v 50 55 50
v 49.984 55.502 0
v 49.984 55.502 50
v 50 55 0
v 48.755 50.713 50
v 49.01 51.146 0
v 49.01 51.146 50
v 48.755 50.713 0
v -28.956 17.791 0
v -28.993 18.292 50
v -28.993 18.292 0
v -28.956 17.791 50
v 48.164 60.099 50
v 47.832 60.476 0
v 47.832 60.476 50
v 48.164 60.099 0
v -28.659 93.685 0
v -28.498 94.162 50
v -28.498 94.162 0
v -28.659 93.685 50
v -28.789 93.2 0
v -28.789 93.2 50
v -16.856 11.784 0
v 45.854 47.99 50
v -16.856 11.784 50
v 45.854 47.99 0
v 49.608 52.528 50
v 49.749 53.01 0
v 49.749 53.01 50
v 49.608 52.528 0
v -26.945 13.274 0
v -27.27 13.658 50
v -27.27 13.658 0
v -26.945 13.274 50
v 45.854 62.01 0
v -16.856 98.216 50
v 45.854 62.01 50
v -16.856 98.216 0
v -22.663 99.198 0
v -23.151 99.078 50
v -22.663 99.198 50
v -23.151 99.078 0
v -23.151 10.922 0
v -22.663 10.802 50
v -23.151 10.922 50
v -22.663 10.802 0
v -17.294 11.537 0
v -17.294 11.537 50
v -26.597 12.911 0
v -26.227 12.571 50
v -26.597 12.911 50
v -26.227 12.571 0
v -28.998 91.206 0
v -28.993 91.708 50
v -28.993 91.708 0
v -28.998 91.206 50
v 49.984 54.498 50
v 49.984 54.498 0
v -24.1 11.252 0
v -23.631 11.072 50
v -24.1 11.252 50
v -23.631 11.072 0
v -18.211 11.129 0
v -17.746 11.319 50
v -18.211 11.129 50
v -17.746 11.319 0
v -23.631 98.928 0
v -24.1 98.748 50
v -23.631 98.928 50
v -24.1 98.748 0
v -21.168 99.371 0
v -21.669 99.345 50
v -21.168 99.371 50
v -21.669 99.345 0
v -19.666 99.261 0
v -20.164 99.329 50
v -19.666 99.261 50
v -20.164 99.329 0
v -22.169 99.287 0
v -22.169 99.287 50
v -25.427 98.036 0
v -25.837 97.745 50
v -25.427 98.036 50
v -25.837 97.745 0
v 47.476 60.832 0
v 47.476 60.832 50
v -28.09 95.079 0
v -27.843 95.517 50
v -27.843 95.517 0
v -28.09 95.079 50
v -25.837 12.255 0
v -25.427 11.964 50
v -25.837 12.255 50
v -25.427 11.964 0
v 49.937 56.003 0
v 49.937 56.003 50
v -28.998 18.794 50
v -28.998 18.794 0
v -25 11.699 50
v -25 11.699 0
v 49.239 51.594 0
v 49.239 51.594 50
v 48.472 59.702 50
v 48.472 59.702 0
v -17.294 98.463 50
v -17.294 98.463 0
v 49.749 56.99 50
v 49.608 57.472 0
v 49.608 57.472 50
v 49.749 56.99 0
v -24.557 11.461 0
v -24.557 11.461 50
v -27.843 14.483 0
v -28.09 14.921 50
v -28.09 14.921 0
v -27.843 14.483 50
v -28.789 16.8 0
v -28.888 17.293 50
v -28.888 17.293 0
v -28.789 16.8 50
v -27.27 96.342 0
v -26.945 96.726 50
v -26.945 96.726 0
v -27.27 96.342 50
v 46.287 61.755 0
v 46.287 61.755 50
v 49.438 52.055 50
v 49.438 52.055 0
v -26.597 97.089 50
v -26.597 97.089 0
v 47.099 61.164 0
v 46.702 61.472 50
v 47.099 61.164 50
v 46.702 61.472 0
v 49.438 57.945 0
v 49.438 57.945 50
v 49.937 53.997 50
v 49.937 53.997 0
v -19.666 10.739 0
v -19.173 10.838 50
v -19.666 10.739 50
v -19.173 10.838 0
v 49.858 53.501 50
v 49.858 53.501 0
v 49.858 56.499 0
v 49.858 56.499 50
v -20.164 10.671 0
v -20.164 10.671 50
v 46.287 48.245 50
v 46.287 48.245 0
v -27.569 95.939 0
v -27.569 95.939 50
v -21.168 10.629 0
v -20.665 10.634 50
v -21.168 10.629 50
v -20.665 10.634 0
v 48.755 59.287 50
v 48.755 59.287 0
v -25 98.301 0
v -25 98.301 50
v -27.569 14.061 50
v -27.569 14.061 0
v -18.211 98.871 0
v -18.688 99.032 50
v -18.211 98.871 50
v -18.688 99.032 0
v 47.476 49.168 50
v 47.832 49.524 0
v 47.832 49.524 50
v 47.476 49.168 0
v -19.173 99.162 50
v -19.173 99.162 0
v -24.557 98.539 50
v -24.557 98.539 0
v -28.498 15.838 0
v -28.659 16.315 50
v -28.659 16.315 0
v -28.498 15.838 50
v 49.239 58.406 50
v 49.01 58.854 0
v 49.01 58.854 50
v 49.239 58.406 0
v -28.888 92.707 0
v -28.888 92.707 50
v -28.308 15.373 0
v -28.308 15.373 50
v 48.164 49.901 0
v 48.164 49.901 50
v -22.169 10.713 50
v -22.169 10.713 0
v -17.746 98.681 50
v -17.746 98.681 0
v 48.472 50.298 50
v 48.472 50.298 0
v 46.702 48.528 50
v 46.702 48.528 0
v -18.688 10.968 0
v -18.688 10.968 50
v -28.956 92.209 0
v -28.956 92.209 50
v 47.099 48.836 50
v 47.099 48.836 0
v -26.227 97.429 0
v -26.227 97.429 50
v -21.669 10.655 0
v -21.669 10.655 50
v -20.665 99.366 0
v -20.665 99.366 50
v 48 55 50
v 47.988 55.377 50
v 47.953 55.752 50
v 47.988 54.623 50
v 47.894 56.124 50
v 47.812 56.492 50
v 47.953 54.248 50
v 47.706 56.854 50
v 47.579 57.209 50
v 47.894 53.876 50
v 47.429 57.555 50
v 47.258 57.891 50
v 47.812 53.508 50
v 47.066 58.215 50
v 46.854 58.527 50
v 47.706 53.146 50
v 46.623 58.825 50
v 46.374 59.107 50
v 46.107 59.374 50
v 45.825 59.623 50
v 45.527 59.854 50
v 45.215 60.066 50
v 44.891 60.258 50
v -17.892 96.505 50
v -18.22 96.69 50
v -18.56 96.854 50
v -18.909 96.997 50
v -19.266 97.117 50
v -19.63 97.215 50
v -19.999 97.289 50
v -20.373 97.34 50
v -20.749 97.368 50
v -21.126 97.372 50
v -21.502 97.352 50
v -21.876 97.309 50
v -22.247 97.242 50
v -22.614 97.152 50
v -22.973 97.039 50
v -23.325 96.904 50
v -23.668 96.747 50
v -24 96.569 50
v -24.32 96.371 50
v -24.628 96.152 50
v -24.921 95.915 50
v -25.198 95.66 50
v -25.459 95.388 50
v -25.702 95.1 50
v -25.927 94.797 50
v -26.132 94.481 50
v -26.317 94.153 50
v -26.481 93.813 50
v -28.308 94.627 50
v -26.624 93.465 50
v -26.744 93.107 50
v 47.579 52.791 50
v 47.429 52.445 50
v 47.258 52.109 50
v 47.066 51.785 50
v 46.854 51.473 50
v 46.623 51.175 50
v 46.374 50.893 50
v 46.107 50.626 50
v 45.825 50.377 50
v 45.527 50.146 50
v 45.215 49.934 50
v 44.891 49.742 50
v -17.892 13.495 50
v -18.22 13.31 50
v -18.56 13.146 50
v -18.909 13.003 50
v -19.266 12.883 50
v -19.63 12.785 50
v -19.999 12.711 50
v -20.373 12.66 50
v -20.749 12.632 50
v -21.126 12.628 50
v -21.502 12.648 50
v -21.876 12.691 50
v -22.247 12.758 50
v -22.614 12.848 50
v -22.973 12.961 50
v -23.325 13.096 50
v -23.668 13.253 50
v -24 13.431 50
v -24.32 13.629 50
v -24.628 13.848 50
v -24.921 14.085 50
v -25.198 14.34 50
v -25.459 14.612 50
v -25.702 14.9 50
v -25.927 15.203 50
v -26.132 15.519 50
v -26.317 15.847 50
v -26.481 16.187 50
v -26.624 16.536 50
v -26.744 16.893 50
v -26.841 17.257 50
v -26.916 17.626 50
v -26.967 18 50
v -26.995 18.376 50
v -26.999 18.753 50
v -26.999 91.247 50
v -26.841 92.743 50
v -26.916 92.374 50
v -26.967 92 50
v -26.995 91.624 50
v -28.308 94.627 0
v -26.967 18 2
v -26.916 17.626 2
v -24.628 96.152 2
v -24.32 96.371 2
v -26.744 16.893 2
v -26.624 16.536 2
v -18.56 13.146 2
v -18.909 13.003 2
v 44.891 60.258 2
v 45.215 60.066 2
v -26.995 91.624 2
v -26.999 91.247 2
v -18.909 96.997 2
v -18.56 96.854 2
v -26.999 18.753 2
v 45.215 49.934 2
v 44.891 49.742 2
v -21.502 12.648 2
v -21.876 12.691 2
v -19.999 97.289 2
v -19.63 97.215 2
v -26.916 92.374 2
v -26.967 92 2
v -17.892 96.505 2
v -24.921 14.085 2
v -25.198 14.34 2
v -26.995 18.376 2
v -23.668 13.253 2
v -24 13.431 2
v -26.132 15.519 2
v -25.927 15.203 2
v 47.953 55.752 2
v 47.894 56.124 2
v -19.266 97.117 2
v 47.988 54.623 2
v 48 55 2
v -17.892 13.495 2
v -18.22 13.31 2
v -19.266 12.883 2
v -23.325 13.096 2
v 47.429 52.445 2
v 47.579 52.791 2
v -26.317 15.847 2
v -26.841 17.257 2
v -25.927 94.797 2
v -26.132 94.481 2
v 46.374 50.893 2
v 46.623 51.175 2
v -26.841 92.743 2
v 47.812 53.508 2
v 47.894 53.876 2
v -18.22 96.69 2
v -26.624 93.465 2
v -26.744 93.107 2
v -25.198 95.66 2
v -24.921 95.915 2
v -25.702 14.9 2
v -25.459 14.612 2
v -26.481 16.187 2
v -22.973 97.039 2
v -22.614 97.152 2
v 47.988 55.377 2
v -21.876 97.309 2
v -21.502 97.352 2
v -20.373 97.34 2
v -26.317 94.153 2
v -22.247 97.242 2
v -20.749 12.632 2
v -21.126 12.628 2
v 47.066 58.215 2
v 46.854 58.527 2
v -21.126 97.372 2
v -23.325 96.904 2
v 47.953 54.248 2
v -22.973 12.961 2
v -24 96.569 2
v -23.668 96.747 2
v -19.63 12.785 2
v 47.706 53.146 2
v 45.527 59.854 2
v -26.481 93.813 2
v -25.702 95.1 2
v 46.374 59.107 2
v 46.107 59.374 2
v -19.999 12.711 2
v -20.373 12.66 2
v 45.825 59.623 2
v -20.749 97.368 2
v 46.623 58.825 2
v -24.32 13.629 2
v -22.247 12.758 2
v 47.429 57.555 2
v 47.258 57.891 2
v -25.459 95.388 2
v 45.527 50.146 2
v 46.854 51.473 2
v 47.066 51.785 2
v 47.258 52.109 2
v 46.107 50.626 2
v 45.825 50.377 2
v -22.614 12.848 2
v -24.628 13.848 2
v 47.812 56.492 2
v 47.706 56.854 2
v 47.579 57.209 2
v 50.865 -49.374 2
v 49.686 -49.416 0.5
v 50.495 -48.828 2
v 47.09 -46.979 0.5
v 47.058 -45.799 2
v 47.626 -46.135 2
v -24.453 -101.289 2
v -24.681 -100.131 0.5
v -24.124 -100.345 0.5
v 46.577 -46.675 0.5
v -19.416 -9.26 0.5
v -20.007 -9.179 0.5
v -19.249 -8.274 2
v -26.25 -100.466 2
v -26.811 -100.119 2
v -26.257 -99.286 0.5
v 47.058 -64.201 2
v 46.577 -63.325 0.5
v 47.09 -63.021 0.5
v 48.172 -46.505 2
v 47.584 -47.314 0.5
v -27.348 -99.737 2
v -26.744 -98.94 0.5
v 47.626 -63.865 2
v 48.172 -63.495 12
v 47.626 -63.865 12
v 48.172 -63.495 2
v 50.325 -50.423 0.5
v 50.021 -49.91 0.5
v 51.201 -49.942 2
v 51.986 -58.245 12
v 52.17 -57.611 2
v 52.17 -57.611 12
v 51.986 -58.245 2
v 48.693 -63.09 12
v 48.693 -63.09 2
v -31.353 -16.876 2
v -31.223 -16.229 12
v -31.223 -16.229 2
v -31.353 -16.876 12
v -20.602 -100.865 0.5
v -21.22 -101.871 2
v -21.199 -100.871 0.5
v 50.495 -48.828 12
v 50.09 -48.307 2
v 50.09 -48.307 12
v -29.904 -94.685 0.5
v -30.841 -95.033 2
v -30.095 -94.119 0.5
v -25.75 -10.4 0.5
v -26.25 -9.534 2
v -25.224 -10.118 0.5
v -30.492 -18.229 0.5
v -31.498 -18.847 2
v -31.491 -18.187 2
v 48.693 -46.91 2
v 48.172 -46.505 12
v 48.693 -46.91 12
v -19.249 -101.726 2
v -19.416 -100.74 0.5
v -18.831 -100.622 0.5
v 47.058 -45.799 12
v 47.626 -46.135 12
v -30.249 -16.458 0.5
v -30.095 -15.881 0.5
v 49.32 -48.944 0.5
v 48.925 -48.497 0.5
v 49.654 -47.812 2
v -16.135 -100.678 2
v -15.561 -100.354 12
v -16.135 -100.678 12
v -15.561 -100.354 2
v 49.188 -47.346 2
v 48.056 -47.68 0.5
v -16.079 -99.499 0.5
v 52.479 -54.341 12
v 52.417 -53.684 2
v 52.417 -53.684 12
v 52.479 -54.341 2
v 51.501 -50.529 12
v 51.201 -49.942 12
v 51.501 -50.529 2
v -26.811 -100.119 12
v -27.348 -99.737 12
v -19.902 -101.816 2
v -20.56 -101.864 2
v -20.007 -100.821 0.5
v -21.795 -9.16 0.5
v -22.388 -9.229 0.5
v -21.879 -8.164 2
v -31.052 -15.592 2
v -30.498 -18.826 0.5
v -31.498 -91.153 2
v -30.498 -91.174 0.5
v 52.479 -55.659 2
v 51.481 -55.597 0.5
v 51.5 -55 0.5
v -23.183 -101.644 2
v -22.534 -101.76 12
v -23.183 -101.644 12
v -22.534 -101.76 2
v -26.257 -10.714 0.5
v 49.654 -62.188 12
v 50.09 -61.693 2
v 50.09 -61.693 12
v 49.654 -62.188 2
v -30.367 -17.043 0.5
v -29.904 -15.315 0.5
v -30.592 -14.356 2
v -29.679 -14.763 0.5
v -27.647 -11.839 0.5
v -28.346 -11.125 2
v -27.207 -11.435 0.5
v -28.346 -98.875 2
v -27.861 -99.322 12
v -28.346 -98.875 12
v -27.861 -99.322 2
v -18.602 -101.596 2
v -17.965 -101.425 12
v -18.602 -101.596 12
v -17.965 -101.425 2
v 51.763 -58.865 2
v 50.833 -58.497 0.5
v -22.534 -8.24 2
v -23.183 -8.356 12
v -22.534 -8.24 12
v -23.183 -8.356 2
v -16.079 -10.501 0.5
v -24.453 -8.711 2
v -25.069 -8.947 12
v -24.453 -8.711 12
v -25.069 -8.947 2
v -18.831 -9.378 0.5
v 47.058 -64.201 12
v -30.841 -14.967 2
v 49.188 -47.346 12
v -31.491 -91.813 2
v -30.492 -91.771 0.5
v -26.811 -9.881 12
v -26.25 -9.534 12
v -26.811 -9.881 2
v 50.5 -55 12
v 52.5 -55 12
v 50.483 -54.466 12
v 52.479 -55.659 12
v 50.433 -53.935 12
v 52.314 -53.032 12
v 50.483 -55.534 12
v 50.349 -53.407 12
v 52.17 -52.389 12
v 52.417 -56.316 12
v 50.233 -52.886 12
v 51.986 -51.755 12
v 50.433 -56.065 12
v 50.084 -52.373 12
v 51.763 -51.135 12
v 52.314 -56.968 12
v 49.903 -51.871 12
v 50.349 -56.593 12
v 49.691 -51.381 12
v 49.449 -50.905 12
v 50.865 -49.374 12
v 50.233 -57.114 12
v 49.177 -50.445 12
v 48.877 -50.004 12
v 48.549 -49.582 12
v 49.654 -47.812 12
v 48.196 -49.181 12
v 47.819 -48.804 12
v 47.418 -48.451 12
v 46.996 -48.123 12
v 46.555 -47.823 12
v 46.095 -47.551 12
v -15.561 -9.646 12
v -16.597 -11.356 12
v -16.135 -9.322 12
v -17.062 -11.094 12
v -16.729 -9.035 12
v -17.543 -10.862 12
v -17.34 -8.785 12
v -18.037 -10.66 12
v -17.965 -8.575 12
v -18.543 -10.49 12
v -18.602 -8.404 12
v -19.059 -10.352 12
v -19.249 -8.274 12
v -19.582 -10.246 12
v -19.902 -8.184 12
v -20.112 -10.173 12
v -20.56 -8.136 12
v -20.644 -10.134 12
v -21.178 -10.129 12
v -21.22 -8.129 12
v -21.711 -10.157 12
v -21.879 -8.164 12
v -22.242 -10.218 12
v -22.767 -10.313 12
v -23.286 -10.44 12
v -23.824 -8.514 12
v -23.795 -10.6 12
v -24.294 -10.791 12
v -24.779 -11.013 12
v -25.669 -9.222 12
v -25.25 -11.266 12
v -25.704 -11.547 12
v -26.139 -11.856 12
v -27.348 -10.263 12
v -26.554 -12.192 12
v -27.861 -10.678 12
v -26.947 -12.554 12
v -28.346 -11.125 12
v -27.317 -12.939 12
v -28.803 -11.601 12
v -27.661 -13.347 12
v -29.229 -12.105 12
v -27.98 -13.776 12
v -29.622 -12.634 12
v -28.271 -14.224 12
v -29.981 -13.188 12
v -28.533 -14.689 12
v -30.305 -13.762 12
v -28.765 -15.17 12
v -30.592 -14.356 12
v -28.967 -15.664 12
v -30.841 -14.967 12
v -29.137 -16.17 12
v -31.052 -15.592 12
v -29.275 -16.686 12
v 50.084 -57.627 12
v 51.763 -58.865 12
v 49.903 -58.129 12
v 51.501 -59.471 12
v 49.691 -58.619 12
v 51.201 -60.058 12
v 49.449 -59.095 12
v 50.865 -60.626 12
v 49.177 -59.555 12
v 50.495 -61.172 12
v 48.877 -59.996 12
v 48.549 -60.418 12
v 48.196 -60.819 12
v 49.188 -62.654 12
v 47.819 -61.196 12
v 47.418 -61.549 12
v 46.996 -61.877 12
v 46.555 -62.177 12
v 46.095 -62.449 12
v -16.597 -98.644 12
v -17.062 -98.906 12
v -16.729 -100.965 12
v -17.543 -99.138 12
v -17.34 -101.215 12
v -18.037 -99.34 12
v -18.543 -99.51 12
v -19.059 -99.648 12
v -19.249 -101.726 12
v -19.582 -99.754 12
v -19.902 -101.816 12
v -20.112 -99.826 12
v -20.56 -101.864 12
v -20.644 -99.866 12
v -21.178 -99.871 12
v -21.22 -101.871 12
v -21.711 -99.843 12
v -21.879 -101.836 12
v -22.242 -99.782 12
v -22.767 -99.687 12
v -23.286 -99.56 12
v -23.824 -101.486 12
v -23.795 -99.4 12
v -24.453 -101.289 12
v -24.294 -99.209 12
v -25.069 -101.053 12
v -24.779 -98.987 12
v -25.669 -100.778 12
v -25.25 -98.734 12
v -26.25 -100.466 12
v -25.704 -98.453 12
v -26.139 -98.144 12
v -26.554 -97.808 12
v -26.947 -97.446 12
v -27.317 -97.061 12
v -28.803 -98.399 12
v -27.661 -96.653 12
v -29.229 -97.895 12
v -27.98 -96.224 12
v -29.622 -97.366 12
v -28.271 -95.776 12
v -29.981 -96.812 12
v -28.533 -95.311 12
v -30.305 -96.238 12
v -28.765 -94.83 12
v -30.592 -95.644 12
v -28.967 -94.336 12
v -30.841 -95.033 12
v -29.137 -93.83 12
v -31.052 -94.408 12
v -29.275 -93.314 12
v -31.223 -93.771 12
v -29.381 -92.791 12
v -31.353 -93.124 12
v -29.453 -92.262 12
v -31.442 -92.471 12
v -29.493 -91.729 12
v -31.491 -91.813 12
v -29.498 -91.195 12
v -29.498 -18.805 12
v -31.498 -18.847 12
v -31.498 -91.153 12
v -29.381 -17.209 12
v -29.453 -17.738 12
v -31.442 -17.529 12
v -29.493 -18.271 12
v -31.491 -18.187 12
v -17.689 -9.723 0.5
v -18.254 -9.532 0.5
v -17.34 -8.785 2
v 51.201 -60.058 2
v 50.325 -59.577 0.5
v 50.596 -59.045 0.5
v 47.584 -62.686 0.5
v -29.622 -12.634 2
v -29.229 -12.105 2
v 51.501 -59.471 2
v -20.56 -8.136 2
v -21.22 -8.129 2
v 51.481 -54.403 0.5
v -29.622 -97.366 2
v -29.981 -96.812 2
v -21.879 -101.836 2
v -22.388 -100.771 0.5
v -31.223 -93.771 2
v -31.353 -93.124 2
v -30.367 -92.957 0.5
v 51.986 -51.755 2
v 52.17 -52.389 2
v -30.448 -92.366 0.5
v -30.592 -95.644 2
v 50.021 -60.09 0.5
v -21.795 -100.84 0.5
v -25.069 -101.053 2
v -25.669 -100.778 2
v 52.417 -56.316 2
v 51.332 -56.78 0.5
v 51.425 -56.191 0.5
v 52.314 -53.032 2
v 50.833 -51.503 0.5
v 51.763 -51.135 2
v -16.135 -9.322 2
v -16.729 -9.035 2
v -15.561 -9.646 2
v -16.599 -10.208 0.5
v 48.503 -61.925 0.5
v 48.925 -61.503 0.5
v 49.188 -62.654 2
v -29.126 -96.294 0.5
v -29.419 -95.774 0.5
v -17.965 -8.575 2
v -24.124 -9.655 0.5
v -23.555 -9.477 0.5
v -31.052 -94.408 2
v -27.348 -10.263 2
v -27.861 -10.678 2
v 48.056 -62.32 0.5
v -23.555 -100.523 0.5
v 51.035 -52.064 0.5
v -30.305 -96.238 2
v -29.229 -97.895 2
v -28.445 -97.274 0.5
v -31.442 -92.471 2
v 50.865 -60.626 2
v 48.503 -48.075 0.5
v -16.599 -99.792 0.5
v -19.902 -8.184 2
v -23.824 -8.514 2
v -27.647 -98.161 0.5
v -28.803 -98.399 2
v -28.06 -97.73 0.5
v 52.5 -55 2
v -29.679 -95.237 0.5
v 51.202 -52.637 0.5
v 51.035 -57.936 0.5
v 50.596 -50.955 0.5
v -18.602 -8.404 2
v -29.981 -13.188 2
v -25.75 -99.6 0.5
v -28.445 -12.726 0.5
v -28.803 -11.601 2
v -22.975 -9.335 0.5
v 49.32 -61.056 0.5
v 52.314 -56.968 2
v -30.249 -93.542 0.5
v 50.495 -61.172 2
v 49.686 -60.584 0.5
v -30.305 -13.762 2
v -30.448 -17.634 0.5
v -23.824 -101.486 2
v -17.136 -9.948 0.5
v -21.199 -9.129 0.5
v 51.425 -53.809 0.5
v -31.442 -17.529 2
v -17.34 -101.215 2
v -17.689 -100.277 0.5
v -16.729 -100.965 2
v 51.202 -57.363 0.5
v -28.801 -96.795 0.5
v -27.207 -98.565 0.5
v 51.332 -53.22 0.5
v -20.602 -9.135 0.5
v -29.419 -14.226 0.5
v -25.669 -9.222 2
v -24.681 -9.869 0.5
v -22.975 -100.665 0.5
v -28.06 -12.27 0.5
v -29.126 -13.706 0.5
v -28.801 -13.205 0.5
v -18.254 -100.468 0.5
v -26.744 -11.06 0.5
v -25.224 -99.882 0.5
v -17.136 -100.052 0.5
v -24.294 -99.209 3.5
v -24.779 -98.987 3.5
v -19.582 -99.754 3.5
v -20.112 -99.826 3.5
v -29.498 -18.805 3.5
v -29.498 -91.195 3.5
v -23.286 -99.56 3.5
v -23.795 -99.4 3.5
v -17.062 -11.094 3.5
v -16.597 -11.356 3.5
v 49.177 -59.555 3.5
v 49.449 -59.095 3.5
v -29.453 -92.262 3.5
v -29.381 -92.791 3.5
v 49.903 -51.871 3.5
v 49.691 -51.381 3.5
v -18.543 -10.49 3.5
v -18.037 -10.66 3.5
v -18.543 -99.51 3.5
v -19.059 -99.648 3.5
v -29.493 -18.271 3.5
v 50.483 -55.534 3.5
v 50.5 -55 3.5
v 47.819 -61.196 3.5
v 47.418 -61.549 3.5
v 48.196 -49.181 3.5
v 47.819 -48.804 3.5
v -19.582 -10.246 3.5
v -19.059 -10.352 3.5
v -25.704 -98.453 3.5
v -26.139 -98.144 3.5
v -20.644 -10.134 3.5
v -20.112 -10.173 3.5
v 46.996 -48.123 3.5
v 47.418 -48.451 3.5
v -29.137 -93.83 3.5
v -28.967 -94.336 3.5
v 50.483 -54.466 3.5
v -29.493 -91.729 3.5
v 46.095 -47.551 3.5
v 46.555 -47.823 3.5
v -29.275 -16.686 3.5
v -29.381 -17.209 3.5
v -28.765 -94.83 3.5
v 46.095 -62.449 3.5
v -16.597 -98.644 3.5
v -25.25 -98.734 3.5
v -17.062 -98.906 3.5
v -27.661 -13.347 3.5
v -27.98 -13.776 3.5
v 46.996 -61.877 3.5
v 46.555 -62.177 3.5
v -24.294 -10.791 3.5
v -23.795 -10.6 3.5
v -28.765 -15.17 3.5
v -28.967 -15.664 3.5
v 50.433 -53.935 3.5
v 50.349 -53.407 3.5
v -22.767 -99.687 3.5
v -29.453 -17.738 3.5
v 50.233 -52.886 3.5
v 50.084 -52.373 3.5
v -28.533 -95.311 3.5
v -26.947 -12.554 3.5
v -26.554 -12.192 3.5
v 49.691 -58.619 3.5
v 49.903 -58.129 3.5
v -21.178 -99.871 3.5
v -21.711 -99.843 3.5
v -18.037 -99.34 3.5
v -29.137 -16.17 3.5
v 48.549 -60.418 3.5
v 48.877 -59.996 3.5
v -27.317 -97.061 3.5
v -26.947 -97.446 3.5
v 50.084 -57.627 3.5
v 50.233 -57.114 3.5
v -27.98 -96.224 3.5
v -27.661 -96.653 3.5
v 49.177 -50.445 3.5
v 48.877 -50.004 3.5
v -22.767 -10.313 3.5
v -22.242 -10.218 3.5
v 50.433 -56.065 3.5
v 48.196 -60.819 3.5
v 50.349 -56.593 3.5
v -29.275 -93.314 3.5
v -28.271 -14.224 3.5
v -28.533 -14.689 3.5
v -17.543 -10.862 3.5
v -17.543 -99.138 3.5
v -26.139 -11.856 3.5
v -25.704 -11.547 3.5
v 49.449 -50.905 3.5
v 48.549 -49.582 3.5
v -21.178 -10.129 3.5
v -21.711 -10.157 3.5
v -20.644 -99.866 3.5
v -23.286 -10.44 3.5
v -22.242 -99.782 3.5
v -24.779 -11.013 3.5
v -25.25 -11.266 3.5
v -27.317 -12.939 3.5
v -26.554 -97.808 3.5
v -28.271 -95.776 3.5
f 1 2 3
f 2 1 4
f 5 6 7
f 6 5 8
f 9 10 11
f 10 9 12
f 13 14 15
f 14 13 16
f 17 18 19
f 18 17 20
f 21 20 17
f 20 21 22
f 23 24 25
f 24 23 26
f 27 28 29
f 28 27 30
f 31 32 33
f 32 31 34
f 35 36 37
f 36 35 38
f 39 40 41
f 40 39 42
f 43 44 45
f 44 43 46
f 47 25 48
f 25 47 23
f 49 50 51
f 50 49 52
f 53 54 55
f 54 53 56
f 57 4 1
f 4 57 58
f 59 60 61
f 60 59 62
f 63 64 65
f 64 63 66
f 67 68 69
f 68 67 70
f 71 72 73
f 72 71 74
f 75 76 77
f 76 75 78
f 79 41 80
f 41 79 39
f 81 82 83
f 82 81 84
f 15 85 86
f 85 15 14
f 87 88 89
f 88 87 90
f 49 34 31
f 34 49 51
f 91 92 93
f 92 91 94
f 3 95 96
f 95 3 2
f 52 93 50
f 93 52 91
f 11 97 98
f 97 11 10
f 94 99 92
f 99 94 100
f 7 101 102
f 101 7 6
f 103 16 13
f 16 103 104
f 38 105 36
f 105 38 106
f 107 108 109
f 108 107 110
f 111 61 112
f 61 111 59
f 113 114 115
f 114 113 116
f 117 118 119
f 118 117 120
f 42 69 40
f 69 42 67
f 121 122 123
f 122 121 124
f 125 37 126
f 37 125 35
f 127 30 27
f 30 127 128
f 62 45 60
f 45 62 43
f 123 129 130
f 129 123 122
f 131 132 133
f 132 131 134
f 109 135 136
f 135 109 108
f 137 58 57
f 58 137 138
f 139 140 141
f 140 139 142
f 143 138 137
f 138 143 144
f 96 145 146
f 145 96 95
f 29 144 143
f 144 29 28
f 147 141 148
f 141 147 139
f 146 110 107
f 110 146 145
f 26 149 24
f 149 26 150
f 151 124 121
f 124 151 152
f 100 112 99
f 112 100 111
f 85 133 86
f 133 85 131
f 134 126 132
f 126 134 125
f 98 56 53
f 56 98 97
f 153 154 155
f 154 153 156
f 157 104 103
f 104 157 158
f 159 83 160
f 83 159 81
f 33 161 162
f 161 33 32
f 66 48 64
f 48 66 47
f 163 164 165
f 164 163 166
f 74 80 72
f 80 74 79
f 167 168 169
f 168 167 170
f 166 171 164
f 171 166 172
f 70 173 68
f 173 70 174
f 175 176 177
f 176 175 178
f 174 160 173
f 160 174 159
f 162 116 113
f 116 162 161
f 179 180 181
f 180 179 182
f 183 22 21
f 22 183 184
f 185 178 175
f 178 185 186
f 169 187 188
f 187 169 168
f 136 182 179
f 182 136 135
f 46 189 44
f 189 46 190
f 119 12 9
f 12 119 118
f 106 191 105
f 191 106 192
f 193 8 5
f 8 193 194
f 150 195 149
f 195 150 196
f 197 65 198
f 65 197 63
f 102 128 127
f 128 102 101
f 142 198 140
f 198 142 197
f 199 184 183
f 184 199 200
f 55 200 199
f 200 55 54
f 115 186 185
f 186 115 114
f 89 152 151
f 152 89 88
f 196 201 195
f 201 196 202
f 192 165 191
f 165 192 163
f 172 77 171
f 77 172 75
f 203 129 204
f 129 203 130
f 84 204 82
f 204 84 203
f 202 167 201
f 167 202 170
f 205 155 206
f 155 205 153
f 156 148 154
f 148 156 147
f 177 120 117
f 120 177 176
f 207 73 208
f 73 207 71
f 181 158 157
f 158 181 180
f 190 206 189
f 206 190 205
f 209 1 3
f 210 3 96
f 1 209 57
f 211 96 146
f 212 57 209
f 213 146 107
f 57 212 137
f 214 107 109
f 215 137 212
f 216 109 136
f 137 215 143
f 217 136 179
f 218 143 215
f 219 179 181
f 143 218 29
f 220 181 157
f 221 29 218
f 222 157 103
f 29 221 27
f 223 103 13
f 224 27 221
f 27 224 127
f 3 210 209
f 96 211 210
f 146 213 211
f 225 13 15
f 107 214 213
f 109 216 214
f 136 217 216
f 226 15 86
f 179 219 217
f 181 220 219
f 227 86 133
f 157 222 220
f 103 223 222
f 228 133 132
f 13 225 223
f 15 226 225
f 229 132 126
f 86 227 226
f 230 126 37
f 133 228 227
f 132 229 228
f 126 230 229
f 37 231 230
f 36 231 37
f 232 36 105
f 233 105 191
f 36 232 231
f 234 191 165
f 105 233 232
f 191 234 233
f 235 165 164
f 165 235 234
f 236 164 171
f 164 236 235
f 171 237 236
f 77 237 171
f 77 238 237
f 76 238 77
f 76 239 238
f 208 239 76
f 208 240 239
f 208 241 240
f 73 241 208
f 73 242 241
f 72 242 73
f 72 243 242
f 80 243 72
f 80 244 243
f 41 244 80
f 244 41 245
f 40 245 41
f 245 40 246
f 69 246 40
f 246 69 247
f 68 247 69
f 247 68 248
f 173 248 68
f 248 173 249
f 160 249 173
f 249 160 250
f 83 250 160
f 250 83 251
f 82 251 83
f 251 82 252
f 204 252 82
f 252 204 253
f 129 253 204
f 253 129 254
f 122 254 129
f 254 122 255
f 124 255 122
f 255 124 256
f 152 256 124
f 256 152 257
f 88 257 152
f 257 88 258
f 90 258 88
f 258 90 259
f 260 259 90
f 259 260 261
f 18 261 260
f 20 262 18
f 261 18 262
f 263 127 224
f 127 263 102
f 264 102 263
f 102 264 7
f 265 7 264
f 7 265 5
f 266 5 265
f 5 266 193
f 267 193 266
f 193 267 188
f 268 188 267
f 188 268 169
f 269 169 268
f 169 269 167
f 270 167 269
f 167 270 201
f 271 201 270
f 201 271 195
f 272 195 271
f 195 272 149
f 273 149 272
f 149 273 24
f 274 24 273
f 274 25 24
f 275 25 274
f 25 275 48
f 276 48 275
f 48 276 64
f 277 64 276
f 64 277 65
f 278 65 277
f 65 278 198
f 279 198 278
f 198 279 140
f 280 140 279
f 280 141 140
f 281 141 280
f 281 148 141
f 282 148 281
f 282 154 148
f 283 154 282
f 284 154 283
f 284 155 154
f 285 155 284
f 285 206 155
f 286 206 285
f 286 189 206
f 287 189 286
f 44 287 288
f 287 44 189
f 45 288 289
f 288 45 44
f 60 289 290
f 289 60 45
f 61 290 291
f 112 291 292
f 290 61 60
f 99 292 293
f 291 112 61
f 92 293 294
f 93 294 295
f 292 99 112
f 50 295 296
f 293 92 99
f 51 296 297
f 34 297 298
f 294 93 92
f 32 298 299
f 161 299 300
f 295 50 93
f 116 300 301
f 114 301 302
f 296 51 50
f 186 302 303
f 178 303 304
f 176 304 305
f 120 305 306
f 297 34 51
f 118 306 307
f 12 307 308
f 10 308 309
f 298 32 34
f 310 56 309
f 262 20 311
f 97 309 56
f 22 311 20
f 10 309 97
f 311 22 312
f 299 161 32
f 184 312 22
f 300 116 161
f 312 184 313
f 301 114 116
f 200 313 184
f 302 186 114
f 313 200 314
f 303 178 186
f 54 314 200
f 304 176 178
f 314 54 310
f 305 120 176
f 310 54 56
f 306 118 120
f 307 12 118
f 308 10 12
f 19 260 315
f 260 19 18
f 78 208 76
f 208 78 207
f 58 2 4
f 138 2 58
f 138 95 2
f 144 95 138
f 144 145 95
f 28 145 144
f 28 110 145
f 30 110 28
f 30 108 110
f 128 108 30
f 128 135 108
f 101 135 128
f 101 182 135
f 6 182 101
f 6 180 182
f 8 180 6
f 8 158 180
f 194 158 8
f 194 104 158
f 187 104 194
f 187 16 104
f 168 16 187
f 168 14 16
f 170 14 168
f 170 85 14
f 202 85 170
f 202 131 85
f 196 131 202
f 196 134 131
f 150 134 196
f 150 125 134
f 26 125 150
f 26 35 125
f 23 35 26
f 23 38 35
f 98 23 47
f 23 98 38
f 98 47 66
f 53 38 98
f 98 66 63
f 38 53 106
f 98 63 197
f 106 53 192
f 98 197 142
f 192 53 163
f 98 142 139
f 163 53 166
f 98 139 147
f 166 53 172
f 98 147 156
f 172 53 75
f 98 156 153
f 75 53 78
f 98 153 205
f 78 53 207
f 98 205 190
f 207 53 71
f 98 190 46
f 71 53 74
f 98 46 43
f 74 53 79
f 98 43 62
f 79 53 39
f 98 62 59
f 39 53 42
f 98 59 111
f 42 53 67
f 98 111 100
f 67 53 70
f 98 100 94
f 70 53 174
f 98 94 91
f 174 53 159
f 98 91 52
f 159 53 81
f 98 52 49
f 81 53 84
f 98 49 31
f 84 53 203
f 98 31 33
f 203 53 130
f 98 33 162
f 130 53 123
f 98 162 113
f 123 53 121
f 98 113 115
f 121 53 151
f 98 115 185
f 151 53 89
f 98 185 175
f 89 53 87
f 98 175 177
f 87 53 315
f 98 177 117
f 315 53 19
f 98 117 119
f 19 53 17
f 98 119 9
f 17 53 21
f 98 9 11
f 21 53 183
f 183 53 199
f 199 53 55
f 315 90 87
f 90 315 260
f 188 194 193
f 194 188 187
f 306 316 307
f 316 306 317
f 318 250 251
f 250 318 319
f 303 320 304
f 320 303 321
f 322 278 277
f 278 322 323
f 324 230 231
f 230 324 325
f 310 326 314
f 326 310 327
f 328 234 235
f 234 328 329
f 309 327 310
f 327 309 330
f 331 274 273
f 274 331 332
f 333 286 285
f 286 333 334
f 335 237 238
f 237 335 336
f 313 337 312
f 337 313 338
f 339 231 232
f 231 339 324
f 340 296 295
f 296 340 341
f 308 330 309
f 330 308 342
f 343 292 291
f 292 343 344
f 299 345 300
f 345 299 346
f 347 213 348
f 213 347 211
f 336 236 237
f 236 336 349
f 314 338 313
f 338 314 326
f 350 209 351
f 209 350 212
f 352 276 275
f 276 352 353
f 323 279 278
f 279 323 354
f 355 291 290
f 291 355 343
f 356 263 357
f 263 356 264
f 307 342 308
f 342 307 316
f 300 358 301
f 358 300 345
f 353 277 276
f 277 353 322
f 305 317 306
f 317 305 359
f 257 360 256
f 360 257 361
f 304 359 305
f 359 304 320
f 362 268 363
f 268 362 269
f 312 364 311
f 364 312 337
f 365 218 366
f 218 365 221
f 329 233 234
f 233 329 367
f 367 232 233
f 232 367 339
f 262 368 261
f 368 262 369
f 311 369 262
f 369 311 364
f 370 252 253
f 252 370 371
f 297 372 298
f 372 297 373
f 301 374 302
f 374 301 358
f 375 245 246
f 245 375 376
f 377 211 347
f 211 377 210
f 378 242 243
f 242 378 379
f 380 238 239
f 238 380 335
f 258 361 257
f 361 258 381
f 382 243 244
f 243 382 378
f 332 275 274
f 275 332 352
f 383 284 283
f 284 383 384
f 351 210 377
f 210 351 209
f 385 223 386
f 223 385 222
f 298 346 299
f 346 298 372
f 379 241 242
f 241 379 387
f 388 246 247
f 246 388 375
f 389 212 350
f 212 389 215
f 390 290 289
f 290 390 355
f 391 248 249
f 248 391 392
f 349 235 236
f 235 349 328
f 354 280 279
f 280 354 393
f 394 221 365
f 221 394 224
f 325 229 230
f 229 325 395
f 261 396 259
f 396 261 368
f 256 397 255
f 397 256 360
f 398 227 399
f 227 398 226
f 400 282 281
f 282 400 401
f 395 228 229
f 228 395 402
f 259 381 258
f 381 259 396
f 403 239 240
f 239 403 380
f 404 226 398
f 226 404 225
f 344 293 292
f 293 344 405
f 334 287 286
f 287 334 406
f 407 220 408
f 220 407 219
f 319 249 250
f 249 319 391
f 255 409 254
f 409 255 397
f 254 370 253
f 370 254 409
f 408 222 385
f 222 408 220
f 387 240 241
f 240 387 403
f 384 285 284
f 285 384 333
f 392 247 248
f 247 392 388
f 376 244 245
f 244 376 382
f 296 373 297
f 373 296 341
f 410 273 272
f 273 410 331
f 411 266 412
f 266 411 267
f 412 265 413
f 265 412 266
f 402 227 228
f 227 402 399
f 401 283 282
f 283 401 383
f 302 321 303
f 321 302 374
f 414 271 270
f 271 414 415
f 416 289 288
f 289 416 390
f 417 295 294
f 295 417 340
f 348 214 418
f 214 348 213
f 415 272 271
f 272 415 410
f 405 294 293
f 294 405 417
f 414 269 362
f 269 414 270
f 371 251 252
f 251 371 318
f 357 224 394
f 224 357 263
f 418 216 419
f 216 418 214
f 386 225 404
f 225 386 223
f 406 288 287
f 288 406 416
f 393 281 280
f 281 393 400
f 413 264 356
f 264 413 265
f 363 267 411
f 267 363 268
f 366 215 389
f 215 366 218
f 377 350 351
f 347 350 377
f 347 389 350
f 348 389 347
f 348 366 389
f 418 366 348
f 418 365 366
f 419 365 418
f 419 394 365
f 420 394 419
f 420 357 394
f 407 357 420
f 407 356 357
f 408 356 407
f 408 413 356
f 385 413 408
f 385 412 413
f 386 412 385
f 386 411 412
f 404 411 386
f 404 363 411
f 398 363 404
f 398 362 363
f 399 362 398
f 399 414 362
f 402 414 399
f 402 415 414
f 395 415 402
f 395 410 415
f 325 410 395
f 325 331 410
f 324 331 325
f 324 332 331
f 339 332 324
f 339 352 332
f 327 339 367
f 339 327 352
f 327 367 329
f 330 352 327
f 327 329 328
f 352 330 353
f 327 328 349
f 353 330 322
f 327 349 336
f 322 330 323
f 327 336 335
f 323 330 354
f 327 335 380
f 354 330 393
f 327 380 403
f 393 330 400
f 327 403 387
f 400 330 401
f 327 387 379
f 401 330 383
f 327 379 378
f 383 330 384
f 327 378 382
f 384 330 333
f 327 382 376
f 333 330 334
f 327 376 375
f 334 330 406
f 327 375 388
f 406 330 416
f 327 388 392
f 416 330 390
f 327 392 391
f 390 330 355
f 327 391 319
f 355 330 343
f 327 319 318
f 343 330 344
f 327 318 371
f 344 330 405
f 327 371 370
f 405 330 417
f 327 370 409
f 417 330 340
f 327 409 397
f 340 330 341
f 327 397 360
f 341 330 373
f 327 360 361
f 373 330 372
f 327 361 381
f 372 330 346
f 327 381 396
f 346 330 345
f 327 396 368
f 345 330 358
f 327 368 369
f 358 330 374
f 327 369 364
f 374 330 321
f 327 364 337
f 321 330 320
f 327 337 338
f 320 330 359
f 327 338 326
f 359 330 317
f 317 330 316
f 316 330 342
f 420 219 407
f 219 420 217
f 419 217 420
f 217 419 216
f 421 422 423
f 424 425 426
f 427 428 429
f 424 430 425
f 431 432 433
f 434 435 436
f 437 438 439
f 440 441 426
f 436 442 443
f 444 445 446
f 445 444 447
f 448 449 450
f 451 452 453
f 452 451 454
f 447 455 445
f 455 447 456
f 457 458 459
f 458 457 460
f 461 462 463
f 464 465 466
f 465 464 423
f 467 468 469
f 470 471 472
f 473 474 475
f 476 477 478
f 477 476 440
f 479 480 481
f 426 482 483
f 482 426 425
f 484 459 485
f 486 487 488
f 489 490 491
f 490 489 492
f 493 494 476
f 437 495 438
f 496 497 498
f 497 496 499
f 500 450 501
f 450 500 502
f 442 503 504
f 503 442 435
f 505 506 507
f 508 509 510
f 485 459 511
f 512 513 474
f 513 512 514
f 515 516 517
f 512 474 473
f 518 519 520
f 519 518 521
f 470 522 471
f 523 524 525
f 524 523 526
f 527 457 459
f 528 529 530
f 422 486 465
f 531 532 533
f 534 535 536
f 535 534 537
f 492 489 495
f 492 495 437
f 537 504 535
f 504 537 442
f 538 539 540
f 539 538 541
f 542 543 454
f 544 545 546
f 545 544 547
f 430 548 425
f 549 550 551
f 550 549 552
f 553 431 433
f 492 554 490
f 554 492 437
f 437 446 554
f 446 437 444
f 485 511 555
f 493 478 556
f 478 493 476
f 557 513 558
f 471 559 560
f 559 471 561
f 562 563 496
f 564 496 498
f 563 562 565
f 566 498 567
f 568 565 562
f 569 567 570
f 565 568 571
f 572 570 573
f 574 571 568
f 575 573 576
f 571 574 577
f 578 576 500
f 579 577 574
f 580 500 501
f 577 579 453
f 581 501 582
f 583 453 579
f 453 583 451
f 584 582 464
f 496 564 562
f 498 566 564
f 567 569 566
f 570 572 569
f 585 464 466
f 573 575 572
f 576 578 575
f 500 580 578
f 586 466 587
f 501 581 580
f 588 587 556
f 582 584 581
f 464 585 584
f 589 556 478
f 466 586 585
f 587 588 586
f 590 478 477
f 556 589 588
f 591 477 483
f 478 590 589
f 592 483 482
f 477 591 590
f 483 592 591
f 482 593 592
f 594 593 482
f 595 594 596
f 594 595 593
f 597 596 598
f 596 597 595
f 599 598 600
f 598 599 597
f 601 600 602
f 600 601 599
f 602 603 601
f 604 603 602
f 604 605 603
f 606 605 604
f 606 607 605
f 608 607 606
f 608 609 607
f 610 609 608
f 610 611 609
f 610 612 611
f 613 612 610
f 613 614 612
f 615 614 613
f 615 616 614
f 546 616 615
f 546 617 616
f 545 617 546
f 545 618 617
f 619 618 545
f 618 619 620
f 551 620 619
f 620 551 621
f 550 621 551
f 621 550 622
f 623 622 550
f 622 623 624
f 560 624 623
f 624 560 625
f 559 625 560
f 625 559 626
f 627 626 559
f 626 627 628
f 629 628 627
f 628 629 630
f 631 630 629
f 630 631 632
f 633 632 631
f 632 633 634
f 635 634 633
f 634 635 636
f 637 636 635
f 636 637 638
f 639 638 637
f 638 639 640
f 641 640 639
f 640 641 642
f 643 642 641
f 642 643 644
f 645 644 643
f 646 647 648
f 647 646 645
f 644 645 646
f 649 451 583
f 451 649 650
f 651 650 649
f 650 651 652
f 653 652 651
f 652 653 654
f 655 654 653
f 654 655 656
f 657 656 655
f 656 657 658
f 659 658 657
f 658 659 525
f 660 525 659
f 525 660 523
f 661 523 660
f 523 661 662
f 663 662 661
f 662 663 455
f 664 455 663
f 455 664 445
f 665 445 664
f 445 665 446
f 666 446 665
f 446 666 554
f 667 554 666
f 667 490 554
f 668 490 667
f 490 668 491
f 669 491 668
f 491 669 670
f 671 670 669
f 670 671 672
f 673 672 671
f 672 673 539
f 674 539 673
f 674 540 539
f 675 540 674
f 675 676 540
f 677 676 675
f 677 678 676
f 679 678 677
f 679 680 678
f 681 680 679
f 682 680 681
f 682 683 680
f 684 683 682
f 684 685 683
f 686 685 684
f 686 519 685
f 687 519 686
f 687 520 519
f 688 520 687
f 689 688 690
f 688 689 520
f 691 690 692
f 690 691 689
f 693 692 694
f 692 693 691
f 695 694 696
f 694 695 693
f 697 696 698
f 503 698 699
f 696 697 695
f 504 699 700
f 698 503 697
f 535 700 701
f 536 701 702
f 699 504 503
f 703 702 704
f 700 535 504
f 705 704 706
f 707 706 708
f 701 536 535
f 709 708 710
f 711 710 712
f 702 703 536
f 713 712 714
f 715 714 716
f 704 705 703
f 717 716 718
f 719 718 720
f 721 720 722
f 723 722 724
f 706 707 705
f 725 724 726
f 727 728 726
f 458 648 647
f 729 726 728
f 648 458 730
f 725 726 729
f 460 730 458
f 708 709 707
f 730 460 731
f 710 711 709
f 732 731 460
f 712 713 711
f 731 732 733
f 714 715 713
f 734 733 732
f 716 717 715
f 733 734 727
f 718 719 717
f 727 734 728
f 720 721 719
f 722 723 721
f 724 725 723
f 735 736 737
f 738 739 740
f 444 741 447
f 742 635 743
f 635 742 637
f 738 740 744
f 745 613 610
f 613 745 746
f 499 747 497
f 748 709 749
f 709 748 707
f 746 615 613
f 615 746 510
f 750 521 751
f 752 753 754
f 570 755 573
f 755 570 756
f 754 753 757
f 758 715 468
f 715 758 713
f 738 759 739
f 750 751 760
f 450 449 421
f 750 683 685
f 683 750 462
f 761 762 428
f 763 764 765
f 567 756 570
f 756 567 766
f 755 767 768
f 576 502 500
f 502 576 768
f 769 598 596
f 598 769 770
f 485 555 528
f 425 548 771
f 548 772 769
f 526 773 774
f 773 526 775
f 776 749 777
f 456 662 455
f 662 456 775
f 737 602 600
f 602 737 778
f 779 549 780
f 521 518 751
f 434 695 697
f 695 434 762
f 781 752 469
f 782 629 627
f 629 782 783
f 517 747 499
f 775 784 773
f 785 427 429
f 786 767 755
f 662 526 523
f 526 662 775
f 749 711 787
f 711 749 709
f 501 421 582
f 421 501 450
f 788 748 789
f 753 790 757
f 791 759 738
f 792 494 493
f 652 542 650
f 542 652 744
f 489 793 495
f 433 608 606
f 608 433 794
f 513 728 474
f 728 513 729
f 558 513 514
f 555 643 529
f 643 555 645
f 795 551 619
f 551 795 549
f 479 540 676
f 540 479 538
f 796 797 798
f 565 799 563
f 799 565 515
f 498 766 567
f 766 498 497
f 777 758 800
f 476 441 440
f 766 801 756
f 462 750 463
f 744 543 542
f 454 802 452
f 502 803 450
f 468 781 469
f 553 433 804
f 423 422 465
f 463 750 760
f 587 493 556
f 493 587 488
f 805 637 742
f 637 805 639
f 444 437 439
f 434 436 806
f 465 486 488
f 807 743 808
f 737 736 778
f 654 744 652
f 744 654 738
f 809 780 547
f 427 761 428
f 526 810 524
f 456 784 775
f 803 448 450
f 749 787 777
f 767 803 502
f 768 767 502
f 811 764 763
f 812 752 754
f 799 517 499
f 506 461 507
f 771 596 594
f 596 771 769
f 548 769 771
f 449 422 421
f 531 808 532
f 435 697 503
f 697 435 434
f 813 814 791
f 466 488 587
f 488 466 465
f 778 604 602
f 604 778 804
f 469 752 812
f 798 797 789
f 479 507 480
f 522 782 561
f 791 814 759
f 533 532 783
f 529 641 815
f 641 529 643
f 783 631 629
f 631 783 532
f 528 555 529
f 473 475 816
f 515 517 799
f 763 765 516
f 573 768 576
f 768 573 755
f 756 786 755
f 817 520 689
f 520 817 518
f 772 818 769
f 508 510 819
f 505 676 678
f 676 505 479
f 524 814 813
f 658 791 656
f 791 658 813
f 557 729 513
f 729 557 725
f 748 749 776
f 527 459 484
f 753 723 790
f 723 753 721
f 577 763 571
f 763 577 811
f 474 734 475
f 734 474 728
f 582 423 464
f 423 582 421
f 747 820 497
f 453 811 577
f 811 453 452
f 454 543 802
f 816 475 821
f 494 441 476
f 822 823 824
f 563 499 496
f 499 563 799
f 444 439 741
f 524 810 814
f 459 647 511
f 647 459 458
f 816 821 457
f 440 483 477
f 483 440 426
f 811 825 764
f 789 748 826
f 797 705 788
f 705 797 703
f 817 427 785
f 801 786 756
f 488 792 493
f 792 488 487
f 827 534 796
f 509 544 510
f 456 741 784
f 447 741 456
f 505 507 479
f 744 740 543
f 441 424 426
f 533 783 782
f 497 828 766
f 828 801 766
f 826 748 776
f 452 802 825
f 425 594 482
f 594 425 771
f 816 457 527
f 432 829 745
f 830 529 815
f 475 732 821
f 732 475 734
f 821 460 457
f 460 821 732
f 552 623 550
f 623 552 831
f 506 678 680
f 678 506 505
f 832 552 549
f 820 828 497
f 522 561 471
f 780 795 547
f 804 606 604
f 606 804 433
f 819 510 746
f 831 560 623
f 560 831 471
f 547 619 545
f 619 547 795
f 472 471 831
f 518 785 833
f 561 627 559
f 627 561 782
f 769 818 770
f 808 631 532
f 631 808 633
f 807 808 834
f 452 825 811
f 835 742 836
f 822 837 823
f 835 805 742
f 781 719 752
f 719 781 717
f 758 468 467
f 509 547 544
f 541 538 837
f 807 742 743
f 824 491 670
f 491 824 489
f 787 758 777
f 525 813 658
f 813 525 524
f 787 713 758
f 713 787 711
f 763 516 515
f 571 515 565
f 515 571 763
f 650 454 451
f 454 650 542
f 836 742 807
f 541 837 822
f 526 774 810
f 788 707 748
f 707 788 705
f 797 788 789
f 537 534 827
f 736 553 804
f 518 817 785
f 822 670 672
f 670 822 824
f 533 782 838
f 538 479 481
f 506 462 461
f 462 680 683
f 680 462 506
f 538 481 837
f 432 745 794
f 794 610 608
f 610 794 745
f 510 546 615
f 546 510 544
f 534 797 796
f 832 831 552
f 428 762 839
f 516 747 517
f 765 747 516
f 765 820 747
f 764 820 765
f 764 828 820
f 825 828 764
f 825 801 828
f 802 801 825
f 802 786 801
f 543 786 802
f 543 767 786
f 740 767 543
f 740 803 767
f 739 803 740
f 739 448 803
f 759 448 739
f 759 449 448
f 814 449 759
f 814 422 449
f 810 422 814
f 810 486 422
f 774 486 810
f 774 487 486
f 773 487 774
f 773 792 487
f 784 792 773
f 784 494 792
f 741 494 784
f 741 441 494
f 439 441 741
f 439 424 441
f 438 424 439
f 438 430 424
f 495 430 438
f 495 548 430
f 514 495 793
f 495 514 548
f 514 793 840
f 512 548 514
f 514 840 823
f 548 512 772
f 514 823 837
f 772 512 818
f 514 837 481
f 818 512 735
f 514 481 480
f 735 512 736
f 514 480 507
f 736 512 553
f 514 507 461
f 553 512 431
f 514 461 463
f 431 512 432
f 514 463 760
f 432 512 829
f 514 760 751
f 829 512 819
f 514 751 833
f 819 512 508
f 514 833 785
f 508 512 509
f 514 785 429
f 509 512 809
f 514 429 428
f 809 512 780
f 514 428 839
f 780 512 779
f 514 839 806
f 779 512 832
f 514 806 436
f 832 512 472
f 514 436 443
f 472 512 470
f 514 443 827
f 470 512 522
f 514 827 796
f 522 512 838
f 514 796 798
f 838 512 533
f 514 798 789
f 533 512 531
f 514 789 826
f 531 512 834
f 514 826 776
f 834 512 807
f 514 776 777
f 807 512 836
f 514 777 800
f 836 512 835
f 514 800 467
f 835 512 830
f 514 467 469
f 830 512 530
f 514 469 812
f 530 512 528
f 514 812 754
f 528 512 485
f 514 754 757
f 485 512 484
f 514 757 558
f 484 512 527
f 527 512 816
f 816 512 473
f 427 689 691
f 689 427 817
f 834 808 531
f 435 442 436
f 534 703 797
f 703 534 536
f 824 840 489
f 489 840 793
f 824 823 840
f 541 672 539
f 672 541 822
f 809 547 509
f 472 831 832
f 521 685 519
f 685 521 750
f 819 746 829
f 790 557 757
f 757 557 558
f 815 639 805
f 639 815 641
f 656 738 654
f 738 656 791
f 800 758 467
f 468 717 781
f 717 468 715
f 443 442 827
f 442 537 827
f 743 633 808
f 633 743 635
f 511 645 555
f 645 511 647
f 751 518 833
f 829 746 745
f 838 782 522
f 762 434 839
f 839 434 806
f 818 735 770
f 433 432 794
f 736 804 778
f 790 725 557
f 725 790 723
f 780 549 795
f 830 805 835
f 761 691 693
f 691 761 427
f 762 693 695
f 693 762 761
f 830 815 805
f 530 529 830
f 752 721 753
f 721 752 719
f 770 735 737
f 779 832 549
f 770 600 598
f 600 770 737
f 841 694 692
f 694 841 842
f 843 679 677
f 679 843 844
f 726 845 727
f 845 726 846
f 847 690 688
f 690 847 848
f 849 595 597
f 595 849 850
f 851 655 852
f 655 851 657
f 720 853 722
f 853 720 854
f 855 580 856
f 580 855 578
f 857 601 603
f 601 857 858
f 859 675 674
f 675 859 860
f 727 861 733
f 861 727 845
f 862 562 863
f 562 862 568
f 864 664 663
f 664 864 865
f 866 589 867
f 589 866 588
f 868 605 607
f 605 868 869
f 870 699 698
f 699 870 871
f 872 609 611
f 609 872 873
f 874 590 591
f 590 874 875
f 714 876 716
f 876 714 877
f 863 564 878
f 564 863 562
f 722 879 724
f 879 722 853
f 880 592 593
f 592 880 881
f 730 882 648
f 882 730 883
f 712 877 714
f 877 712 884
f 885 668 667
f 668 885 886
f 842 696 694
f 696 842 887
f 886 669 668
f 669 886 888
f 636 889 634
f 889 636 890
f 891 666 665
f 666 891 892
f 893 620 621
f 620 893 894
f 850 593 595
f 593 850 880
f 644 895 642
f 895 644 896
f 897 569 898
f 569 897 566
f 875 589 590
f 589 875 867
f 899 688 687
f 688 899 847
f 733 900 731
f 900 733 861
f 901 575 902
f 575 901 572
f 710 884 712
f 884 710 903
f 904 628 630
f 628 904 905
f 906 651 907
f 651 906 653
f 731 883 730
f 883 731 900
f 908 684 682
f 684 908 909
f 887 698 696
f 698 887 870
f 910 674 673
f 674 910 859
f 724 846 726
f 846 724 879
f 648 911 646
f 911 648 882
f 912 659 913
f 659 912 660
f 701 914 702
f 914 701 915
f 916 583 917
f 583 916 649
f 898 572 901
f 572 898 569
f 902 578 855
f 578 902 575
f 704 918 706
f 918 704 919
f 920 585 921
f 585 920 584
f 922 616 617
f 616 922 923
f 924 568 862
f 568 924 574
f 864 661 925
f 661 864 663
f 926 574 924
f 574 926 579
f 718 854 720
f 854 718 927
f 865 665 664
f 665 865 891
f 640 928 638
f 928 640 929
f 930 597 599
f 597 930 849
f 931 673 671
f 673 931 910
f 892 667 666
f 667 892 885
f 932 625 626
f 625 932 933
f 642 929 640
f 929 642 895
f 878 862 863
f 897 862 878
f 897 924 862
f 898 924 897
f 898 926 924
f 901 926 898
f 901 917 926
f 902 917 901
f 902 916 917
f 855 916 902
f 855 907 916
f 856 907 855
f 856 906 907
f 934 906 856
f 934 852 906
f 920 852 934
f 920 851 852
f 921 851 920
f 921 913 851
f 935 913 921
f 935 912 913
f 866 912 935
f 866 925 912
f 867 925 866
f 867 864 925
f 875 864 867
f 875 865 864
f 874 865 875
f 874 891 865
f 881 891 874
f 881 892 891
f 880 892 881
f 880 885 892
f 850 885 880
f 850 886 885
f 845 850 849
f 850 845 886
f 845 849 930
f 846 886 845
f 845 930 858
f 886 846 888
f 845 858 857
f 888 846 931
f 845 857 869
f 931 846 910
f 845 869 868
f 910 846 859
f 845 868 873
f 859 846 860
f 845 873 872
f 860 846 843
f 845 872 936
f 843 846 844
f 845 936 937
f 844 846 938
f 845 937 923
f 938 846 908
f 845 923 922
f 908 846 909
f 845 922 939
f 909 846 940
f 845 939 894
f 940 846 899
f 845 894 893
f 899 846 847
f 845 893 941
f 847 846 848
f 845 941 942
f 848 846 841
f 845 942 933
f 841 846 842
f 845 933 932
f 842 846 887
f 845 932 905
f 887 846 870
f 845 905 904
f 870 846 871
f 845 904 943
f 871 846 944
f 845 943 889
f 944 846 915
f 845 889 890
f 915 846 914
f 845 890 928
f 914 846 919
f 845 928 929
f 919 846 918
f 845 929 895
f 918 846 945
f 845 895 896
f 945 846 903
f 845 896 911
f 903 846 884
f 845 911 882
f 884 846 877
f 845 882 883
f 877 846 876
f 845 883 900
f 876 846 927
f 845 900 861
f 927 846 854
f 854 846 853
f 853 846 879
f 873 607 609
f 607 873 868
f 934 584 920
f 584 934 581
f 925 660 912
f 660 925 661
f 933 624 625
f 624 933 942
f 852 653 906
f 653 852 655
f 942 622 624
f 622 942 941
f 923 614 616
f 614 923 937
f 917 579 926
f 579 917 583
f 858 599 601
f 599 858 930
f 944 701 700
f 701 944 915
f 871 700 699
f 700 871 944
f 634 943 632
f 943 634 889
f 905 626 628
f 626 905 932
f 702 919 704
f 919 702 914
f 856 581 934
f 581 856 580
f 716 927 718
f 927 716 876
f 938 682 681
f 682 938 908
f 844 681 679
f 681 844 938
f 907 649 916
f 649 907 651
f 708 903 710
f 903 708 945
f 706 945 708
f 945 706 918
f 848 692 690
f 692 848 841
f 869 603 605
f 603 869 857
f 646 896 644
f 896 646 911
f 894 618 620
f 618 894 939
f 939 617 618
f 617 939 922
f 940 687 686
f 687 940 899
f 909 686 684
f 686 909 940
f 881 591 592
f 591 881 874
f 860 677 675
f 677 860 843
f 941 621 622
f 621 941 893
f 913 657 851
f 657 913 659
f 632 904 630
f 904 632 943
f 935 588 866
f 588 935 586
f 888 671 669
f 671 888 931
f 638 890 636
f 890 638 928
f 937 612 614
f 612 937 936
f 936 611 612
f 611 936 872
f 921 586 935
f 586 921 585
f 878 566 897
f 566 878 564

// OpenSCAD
// trinket_box.scad
// library for parametric Trinket Box, Container, Enclosure, Organizer, Storage
// Author: Tony Z. Tonchev, Michigan (USA) 
// last update: February 2019

// PolyBox Number of Sides
PolyBox_Sides = 3; //[3:3-SIDED, 4:4-SIDED, 5:5-SIDED, 6:6-SIDED, 7:7-SIDED, 8:8-SIDED]

// Polybox Diameter (in mm)
PolyBox_Diameter = 100;

// Polybox Depth (in mm)
PolyBox_Depth = 50;

// Box corner radius (in mm)
PolyBox_Corner_Radius = 8; //[4:50]

// Box Thickness
PolyBox_Thickness = 2; //[1:5]

// Group
Build_Group = 1; //[1:BOTH, 2:BOX, 3:LID]

/* [Hidden] */

TZT_S = PolyBox_Sides;
TZT_R = PolyBox_Diameter/2;
TZT_D = PolyBox_Depth;
TZT_C = PolyBox_Corner_Radius;
TZT_T = PolyBox_Thickness;
$fn=100;


//TZT_Box ([sides, radius, depth, corner_radius])

if (Build_Group!=3) translate ([0,TZT_R*1.1,0]) TZT_Box ();
if (Build_Group!=2) translate ([0,-TZT_R*1.1,0]) TZT_Lid ();

module TZT_Lid () {
    translate ([0,0,7])
    difference () {
        hull () {
            TZT_Vol ([TZT_S,TZT_R+TZT_T+.5,10,TZT_C+TZT_T+.5]);
            translate ([0,0,-6]) TZT_Vol ([TZT_S,TZT_R+TZT_T-.5,1,TZT_C+TZT_T-.5]);
        }
        translate ([0,0,TZT_T]) TZT_Vol ([TZT_S,TZT_R+.5,11,TZT_C+.5]);
    }
}

module TZT_Box () {
    translate ([0,0,TZT_D/2])
        difference () {
            TZT_Vol ([TZT_S,TZT_R,TZT_D,TZT_C]);
            translate ([0,0,TZT_T]) TZT_Vol ([TZT_S,TZT_R-TZT_T,TZT_D,TZT_C-TZT_T]);
        }
}

module TZT_Vol (TZT) {
    hull ()
        for (i=[0:360/TZT[0]:359])
        rotate ([0,0,i])
        translate ([TZT[1]-TZT[3], 0, 0]) 
        cylinder (TZT[2], TZT[3], TZT[3], true);
}
